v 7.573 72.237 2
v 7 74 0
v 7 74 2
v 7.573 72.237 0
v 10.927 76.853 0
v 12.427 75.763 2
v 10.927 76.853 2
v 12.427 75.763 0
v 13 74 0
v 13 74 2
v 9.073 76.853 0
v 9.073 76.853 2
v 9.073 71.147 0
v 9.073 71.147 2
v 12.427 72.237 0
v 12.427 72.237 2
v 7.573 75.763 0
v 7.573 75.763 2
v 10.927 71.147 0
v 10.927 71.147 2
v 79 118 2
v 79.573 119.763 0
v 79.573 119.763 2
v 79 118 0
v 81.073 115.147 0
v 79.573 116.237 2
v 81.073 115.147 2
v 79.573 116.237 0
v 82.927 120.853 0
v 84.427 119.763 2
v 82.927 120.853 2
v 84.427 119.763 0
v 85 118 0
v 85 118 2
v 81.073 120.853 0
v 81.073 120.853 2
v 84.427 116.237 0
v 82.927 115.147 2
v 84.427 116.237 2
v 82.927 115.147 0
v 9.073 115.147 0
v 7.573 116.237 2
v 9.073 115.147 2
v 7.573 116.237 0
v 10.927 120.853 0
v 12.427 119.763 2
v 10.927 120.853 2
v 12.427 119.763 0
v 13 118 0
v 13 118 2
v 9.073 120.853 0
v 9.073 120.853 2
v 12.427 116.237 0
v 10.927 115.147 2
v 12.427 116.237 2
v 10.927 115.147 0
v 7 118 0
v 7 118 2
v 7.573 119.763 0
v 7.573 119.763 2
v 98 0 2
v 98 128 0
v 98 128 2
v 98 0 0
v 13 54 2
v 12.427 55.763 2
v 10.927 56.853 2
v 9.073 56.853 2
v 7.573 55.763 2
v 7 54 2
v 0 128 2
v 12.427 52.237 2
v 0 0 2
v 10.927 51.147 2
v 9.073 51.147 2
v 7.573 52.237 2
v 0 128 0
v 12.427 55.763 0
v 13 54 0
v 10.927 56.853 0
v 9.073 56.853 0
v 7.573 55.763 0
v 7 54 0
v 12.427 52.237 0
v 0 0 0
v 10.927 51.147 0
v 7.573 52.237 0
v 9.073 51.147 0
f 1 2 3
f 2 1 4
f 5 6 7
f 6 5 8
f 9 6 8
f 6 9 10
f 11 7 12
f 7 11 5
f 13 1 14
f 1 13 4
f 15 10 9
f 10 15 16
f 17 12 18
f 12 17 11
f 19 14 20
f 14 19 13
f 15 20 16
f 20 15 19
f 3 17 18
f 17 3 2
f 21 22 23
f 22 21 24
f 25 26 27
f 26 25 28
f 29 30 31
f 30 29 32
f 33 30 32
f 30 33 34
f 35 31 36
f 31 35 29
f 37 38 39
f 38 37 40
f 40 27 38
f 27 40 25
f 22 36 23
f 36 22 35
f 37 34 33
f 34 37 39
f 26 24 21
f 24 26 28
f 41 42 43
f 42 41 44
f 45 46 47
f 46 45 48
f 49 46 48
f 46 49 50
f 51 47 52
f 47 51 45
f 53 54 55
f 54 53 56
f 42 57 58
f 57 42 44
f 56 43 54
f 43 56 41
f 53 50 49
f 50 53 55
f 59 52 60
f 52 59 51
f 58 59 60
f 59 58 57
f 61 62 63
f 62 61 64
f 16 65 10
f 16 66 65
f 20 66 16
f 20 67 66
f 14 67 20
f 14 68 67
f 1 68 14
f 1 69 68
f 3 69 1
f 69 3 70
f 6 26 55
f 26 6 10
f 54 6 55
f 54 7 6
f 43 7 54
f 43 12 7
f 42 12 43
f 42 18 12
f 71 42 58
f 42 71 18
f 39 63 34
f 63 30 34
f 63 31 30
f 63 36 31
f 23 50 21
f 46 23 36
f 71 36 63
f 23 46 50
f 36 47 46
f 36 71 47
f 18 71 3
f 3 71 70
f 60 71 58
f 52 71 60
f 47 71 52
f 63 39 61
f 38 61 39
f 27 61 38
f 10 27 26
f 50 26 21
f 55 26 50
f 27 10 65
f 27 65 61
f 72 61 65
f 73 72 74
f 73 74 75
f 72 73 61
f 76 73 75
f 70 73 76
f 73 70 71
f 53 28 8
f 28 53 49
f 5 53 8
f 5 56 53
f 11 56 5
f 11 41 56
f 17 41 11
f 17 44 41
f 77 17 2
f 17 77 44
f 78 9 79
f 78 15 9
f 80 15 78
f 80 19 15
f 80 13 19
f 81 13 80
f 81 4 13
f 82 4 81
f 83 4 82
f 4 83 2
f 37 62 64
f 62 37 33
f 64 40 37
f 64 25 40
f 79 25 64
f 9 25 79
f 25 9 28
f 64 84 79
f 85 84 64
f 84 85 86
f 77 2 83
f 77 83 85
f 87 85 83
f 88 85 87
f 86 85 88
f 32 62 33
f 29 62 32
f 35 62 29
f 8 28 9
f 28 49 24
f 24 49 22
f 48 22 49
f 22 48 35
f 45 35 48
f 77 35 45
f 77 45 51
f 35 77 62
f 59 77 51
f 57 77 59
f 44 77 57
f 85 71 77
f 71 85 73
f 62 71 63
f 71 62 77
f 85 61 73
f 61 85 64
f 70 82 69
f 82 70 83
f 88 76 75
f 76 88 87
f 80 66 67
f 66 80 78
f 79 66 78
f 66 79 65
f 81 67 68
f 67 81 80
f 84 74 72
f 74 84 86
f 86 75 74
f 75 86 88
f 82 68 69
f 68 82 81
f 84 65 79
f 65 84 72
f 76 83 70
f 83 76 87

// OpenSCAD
// CSG.scad - Basic example of CSG usage

x_shift=10;

plate_width=88+x_shift;
keyboard_height=54;
rook_height=44;
margin_between=20;
margin_above=10;
plate_height=keyboard_height+rook_height+margin_between+margin_above;

r_h1_x=0;
r_h1_y=0;
r_h2_x=72;
r_h2_y=44;
r_h3_x=0;
r_h3_y=44;


y_shift=keyboard_height+margin_between;
height=100;
BottomRadius=3;

difference() {
cube(size=[plate_width,plate_height,2],center=false);

translate([x_shift,y_shift,0]) {
//r_h1:
translate([r_h1_x,r_h1_y,0])
cylinder(h = height, r = BottomRadius, center = true);

//r_h2:
translate([r_h2_x,r_h2_y,0])
cylinder(h = height, r = BottomRadius, center = true);

//r_h3:
translate([r_h3_x,r_h3_y,0])
cylinder(h = height, r = BottomRadius, center = true);
}

//keyboard hole
translate([x_shift,keyboard_height,0])
cylinder(h = height, r = BottomRadius, center = true);
}
/*
translate([-24,0,0]) {
    union() {
        cube(15, center=true);
        sphere(10);
    }
}

intersection() {
    cube(15, center=true);
    sphere(10);
}

translate([24,0,0]) {
    difference() {
        cube(15, center=true);
        cube(10, center=true);
    }
}
*/

echo(version=version());
// Written by Marius Kintel <marius@kintel.net>
//
// To the extent possible under law, the author(s) have dedicated all
// copyright and related and neighboring rights to this software to the
// public domain worldwide. This software is distributed without any
// warranty.
//
// You should have received a copy of the CC0 Public Domain
// Dedication along with this software.
// If not, see <http://creativecommons.org/publicdomain/zero/1.0/>.
